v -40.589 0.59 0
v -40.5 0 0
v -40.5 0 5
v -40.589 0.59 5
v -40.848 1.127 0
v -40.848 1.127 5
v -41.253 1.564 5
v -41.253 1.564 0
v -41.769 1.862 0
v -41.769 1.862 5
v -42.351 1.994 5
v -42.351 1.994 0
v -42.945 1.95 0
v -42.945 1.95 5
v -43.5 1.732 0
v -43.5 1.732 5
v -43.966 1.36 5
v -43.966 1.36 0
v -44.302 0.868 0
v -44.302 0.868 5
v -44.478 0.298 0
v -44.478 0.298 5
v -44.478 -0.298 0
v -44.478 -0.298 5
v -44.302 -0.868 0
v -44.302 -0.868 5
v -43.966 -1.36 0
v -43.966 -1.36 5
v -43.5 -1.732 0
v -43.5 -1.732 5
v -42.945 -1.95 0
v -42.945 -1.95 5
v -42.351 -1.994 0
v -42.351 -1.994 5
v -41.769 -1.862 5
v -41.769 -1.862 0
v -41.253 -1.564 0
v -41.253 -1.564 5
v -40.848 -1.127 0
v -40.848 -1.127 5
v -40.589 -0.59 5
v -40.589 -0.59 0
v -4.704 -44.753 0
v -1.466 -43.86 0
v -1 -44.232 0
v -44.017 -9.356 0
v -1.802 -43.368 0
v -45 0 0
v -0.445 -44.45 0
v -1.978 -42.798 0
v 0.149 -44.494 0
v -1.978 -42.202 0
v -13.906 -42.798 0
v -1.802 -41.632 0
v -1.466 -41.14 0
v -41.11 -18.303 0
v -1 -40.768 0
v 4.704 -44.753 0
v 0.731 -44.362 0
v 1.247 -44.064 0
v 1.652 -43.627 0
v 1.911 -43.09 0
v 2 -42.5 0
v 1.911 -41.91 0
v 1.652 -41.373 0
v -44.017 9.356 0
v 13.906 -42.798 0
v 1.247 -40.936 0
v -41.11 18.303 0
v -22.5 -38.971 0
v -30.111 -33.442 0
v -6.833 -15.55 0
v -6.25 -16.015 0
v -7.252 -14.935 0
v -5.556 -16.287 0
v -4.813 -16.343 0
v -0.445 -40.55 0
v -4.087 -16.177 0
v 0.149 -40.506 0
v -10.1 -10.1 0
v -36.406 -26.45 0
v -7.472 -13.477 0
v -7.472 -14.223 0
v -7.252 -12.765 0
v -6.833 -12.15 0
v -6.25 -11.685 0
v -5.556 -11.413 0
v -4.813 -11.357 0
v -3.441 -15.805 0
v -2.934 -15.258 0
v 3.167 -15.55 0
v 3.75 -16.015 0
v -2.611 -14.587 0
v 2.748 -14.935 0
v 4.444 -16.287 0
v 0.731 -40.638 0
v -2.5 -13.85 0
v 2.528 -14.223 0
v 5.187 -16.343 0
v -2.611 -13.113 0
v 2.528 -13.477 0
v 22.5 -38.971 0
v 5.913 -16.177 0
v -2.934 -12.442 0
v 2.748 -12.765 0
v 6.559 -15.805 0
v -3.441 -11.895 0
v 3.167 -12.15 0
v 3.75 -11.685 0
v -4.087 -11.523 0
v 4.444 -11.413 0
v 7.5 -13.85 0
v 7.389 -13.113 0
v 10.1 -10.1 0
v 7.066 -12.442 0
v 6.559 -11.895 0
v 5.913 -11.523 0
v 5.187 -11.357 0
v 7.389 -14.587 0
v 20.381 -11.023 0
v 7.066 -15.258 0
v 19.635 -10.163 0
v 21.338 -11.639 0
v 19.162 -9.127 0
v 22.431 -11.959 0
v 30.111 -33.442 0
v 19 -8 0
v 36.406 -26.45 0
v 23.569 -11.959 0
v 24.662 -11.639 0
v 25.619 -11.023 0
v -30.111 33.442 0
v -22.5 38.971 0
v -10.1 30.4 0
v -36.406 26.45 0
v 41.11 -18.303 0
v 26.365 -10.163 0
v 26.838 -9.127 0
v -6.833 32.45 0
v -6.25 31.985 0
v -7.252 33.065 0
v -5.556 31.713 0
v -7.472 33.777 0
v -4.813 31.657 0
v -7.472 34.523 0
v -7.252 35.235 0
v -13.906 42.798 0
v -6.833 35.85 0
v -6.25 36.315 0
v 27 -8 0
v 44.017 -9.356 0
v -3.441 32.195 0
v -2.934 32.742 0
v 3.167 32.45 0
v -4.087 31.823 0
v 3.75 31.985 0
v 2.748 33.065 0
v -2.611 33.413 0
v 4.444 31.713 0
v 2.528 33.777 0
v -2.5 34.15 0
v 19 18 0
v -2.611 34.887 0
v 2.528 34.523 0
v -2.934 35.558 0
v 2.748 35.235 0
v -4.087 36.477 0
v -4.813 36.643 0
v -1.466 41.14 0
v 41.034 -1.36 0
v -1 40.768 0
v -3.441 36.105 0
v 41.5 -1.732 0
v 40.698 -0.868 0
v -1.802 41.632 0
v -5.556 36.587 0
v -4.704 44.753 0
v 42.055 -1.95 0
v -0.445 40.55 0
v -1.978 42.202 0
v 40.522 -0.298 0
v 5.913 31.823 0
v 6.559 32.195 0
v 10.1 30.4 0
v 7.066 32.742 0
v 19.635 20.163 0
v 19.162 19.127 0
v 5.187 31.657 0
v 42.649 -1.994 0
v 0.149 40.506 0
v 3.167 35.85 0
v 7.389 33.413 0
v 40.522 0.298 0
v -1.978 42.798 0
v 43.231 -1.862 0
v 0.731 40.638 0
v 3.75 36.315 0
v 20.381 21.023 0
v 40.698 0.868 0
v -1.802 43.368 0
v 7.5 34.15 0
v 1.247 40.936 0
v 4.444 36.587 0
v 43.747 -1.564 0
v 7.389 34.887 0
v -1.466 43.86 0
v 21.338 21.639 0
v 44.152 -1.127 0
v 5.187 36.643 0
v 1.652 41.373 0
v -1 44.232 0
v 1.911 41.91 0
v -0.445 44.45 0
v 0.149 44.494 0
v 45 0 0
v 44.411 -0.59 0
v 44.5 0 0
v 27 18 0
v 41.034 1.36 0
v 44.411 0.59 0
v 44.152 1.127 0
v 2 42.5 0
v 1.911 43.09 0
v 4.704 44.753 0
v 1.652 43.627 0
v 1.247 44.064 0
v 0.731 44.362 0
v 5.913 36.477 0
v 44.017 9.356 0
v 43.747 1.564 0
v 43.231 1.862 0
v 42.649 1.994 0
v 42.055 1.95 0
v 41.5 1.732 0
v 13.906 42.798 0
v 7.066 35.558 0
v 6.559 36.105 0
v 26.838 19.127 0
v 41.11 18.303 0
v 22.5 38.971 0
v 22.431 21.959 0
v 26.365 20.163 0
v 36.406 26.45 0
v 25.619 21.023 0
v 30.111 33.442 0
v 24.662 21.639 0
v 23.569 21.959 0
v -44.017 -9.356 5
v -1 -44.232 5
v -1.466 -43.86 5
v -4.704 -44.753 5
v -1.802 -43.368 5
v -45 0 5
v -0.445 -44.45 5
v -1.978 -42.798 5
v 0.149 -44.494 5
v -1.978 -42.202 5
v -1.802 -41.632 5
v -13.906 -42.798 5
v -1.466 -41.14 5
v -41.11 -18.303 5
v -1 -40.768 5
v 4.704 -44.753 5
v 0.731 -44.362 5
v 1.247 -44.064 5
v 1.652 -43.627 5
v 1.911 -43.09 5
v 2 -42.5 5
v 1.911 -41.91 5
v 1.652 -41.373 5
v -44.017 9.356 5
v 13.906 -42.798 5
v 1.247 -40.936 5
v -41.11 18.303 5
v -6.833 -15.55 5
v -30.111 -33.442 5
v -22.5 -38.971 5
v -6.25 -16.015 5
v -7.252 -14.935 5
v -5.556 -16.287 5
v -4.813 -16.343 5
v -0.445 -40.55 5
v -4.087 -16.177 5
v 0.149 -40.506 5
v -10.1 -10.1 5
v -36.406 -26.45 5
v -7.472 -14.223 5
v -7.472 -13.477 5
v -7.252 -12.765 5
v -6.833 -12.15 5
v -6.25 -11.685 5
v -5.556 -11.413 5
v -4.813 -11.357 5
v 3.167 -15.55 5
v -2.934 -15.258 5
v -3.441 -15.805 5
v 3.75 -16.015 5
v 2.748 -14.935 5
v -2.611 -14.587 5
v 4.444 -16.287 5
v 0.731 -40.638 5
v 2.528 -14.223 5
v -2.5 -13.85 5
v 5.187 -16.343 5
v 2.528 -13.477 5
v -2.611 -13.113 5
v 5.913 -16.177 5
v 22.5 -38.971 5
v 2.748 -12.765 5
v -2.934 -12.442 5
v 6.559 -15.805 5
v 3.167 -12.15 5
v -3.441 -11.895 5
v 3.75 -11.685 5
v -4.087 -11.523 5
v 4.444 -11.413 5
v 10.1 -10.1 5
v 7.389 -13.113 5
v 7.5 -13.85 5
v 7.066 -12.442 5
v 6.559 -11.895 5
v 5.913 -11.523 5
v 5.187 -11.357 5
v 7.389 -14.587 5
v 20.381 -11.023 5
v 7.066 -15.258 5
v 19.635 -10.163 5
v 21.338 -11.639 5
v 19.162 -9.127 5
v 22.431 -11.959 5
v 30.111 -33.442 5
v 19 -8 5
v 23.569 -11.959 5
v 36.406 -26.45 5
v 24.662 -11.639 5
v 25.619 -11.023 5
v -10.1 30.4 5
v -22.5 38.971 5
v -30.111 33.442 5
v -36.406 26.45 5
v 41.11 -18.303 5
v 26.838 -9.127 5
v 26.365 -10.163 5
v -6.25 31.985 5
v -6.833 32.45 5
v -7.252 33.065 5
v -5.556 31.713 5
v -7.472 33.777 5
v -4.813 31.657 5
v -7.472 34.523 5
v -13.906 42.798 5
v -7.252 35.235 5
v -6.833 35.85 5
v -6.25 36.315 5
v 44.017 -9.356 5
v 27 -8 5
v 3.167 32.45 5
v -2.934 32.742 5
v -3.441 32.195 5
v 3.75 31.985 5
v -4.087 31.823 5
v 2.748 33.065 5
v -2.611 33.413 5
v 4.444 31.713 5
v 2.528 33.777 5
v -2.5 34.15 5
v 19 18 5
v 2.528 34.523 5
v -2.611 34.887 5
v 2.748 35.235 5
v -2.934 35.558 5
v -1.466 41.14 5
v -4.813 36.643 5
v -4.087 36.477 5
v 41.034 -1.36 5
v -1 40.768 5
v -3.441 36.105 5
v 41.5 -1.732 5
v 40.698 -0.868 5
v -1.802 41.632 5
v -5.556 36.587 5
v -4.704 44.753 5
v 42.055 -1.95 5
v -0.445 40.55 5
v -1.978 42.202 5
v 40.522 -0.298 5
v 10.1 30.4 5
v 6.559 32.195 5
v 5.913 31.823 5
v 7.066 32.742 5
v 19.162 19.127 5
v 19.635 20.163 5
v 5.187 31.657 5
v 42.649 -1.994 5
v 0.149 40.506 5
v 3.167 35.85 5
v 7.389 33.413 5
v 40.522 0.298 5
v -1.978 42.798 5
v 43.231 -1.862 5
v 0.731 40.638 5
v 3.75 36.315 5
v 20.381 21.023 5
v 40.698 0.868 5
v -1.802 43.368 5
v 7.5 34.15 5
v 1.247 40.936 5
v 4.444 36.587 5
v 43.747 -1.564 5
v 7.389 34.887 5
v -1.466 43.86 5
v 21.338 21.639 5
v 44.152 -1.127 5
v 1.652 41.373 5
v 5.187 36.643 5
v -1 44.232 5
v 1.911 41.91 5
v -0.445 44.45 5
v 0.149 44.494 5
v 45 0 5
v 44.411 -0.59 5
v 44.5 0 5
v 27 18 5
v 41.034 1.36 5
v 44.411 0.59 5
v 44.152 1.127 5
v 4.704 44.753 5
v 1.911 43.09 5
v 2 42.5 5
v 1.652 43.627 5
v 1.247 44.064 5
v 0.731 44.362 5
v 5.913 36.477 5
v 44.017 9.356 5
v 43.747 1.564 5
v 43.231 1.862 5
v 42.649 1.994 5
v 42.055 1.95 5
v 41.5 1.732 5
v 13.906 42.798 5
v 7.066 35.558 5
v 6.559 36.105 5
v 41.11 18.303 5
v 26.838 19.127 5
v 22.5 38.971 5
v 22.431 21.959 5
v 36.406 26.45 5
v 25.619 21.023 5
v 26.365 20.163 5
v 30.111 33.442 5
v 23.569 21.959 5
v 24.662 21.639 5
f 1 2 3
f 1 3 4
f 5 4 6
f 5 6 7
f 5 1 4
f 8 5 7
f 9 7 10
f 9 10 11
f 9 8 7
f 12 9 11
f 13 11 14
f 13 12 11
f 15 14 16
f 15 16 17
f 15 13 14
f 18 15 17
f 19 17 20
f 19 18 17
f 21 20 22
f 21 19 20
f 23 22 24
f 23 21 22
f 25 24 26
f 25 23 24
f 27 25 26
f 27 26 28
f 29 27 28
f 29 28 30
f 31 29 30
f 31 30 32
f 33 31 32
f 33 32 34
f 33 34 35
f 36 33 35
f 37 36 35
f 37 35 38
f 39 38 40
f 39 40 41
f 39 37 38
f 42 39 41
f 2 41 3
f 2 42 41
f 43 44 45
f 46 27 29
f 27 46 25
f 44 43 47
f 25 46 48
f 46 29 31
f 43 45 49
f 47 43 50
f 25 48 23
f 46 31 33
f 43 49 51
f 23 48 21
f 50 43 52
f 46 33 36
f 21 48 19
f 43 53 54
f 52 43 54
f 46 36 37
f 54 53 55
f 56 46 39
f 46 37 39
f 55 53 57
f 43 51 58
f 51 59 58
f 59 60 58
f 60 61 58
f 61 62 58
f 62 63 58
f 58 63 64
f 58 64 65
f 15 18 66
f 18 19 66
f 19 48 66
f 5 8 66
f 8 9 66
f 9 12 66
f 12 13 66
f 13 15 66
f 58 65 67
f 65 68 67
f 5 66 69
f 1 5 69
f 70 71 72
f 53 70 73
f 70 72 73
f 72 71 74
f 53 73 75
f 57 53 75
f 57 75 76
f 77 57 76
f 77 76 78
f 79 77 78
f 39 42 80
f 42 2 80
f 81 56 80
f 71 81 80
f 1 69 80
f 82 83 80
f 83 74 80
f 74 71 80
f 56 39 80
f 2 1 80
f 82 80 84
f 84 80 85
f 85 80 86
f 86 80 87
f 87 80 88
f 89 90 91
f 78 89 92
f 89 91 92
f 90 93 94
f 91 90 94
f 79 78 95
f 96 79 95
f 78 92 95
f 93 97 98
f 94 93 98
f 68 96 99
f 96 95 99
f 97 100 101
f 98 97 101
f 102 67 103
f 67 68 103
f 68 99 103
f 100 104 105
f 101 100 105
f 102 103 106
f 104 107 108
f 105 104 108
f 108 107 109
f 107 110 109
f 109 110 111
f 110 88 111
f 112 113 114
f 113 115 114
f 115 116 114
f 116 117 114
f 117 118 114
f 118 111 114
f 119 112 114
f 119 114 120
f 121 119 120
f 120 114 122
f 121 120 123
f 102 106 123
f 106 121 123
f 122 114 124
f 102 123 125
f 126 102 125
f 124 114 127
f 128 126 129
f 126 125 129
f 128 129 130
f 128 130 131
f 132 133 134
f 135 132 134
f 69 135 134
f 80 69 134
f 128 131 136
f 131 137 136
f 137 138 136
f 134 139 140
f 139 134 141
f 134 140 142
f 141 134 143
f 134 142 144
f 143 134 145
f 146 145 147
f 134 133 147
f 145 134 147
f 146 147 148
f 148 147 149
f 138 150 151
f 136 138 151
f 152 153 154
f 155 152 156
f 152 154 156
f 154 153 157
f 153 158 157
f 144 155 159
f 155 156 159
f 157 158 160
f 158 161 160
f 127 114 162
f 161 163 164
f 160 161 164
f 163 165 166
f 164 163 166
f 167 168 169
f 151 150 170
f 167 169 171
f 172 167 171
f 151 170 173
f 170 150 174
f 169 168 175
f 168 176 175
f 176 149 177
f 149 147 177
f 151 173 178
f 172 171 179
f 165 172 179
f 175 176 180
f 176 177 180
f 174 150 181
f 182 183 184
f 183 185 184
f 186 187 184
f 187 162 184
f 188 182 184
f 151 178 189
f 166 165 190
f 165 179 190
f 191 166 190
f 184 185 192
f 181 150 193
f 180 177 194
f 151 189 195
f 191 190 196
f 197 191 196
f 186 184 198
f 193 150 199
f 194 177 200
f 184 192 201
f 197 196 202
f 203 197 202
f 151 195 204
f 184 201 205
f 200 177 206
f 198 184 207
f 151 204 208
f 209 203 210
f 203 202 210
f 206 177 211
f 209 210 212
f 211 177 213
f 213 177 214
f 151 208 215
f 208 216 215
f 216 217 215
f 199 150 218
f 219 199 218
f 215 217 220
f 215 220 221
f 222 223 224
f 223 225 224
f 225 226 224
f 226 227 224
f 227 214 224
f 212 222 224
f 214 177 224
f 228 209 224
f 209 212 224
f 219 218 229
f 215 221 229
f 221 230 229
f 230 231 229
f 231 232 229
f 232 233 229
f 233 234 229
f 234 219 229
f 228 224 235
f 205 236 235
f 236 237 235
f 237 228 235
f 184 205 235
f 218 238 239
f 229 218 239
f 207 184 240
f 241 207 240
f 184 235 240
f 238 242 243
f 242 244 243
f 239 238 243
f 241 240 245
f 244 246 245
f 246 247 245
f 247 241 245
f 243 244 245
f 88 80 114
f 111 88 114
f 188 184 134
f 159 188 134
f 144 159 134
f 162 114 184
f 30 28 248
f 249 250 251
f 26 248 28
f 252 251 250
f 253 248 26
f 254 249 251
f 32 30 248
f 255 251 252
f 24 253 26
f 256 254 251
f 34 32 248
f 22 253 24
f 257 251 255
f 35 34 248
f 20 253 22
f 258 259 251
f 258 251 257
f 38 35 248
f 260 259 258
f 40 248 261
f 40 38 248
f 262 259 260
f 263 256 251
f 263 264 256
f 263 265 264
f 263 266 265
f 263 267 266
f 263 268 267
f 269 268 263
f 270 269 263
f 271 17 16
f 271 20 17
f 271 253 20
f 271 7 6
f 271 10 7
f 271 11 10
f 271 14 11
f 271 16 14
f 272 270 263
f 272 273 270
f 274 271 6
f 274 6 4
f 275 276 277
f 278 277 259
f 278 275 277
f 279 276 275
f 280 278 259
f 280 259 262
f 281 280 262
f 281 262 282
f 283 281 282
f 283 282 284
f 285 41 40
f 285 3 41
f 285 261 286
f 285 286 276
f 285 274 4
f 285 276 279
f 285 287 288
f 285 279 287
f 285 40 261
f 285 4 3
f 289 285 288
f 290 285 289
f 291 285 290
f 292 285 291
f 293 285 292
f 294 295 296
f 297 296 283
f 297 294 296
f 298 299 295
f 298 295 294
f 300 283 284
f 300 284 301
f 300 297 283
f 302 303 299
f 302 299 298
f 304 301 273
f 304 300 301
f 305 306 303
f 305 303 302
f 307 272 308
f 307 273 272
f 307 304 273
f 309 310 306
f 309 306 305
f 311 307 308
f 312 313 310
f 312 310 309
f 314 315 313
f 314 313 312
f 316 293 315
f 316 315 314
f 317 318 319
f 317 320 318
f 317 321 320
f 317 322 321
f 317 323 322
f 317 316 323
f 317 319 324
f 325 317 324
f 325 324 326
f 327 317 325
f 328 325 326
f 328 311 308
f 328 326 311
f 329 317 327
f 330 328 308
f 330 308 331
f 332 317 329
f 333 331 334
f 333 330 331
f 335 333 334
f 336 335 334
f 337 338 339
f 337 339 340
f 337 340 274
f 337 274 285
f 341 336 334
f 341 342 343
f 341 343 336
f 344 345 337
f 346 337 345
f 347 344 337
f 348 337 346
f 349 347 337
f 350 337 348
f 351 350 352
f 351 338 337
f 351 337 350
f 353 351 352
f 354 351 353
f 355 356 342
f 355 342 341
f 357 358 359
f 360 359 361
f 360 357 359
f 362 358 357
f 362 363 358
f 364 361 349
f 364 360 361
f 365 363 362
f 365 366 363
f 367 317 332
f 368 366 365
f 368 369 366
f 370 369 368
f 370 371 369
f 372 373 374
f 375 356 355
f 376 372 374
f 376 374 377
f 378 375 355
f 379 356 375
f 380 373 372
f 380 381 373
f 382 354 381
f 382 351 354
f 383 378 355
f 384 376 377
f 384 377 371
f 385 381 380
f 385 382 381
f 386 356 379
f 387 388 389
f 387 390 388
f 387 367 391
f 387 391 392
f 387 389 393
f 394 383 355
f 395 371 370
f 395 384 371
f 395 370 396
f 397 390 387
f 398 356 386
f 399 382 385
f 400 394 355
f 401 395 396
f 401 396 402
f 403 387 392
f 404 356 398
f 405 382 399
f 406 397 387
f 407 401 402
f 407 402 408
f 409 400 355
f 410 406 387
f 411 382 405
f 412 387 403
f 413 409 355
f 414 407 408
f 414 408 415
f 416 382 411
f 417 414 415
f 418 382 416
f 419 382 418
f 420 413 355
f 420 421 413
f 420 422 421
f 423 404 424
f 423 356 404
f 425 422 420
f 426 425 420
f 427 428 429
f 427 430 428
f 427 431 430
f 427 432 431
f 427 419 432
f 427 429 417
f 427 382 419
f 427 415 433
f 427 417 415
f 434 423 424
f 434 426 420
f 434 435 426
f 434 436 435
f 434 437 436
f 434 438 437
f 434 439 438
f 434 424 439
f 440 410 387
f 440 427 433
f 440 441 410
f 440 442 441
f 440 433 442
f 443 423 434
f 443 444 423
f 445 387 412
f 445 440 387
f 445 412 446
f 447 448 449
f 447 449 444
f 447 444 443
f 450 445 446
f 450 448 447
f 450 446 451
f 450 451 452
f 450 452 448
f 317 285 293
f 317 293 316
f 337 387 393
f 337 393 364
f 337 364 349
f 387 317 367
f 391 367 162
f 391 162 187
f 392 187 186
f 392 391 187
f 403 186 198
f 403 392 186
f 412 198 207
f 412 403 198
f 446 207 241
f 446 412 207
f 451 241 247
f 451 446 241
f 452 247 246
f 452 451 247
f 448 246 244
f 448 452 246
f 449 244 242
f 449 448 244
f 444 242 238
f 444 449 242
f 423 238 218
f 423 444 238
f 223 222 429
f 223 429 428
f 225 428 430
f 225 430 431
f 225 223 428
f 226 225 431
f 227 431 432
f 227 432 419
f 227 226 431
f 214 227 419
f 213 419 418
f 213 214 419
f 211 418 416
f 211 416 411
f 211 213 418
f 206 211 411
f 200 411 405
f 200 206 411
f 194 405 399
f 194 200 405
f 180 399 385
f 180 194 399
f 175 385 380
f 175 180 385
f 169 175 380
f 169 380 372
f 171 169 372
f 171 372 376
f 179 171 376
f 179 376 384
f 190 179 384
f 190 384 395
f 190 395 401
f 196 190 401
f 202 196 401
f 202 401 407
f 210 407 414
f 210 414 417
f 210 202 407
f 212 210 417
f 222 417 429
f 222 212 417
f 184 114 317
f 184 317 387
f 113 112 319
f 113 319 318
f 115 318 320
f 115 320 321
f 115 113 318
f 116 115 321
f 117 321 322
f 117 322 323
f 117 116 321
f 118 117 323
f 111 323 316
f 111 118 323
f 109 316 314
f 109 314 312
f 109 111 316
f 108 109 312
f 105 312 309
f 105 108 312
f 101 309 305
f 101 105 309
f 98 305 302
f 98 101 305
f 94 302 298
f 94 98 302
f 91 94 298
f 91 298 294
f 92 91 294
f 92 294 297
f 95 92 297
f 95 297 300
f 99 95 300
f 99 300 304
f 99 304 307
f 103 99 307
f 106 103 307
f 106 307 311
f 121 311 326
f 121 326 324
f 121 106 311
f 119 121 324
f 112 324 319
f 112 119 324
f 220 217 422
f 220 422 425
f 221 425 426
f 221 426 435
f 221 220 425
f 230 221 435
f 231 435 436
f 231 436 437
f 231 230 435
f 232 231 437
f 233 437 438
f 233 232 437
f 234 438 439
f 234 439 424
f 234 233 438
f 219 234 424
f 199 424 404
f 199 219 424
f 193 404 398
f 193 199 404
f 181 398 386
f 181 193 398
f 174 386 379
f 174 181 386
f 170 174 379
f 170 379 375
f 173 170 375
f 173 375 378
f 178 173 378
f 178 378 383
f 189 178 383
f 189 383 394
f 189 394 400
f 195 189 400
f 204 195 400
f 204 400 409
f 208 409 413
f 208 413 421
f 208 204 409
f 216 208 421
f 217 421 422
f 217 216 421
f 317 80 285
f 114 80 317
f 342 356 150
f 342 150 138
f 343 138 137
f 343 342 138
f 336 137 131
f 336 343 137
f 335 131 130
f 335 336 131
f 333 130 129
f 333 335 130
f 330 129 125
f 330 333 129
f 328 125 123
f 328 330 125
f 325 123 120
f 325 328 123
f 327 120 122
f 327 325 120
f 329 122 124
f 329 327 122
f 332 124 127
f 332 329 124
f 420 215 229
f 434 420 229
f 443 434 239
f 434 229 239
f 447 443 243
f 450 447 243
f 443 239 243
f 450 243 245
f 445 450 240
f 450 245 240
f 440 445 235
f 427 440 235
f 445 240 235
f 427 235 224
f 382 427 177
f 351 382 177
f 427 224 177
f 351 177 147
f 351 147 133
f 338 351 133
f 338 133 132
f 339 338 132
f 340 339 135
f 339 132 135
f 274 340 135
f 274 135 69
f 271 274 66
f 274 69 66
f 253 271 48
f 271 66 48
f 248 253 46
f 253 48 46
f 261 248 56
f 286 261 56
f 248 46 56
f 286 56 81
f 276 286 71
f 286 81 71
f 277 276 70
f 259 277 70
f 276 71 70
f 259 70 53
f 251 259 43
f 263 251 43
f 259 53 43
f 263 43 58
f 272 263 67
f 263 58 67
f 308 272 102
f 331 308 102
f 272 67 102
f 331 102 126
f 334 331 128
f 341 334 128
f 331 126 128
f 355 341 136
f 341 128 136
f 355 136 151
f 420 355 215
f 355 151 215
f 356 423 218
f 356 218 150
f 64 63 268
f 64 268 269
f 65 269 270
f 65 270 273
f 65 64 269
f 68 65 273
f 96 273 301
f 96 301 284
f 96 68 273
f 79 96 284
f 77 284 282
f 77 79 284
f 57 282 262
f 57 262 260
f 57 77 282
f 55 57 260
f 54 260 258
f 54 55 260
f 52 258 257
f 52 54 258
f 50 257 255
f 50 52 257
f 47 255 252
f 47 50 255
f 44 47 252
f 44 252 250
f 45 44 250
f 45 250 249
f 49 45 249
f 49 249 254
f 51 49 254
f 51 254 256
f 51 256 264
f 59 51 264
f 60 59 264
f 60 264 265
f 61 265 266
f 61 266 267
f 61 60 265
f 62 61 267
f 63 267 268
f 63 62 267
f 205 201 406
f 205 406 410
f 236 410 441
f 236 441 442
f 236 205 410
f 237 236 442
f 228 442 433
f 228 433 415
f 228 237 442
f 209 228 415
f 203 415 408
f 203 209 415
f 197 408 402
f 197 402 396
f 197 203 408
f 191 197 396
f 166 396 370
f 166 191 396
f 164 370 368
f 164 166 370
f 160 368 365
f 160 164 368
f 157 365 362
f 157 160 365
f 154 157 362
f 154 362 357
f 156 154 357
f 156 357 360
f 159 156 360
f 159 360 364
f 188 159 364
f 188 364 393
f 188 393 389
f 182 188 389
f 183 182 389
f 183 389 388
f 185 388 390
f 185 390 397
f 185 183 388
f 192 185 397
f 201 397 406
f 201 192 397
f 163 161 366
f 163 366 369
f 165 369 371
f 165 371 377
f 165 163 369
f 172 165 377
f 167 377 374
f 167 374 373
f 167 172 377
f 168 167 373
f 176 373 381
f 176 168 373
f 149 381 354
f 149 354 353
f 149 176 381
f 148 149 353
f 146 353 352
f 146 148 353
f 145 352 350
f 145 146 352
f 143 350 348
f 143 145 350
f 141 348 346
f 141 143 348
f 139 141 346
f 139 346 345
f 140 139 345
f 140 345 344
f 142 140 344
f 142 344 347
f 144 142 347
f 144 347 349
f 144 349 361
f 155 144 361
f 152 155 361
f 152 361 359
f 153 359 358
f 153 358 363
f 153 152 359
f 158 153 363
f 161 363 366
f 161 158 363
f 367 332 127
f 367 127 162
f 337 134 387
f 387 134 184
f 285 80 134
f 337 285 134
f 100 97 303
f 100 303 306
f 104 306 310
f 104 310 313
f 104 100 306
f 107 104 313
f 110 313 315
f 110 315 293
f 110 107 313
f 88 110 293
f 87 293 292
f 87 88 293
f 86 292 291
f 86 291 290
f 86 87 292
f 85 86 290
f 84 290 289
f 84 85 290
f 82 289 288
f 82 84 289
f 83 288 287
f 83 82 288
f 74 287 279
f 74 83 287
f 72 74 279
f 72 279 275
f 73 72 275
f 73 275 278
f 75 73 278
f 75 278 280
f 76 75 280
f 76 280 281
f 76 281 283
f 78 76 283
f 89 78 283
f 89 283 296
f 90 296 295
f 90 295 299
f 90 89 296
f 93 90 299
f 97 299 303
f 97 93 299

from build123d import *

# Parameters (mm, degrees)
SKETCH1_R           = 45
SKETCH1_R_2         = 2
SKETCH1_R_3         = 2.5
SKETCH1_W           = 20.2
SKETCH1_H           = 40.5
BOSS_EXTRUDE1_DEPTH = 5
CUT_EXTRUDE1_DEPTH  = 10


with BuildPart() as part:
    # Sketch1 → Boss-Extrude1 (new body)
    with BuildSketch(Plane.XY):
        Circle(SKETCH1_R)
        with Locations((0, 42.5)):
            Circle(SKETCH1_R_2, mode=Mode.SUBTRACT)
        with Locations((-42.5, 0)):
            Circle(SKETCH1_R_2, mode=Mode.SUBTRACT)
        with Locations((0, -42.5)):
            Circle(SKETCH1_R_2, mode=Mode.SUBTRACT)
        with Locations((42.5, 0)):
            Circle(SKETCH1_R_2, mode=Mode.SUBTRACT)
        with Locations((-5, -13.85)):
            Circle(SKETCH1_R_3, mode=Mode.SUBTRACT)
        with Locations((5, -13.85)):
            Circle(SKETCH1_R_3, mode=Mode.SUBTRACT)
        with Locations((5, 34.15)):
            Circle(SKETCH1_R_3, mode=Mode.SUBTRACT)
        with Locations((-5, 34.15)):
            Circle(SKETCH1_R_3, mode=Mode.SUBTRACT)
        with Locations((0, 10.15)):
            Rectangle(SKETCH1_W, SKETCH1_H, mode=Mode.SUBTRACT)
    extrude(amount=BOSS_EXTRUDE1_DEPTH)

    # Sketch2 → Cut-Extrude1 (cut)
    with BuildSketch(Plane.XY.offset(5)):
        with BuildLine():
            Line((27, 18), (27, -8))
            ThreePointArc((27, -8), (23, -12), (19, -8))
            Line((19, -8), (19, 18))
            ThreePointArc((19, 18), (23, 22), (27, 18))
        make_face()
    extrude(amount=-CUT_EXTRUDE1_DEPTH, mode=Mode.SUBTRACT)


solid = part.part
